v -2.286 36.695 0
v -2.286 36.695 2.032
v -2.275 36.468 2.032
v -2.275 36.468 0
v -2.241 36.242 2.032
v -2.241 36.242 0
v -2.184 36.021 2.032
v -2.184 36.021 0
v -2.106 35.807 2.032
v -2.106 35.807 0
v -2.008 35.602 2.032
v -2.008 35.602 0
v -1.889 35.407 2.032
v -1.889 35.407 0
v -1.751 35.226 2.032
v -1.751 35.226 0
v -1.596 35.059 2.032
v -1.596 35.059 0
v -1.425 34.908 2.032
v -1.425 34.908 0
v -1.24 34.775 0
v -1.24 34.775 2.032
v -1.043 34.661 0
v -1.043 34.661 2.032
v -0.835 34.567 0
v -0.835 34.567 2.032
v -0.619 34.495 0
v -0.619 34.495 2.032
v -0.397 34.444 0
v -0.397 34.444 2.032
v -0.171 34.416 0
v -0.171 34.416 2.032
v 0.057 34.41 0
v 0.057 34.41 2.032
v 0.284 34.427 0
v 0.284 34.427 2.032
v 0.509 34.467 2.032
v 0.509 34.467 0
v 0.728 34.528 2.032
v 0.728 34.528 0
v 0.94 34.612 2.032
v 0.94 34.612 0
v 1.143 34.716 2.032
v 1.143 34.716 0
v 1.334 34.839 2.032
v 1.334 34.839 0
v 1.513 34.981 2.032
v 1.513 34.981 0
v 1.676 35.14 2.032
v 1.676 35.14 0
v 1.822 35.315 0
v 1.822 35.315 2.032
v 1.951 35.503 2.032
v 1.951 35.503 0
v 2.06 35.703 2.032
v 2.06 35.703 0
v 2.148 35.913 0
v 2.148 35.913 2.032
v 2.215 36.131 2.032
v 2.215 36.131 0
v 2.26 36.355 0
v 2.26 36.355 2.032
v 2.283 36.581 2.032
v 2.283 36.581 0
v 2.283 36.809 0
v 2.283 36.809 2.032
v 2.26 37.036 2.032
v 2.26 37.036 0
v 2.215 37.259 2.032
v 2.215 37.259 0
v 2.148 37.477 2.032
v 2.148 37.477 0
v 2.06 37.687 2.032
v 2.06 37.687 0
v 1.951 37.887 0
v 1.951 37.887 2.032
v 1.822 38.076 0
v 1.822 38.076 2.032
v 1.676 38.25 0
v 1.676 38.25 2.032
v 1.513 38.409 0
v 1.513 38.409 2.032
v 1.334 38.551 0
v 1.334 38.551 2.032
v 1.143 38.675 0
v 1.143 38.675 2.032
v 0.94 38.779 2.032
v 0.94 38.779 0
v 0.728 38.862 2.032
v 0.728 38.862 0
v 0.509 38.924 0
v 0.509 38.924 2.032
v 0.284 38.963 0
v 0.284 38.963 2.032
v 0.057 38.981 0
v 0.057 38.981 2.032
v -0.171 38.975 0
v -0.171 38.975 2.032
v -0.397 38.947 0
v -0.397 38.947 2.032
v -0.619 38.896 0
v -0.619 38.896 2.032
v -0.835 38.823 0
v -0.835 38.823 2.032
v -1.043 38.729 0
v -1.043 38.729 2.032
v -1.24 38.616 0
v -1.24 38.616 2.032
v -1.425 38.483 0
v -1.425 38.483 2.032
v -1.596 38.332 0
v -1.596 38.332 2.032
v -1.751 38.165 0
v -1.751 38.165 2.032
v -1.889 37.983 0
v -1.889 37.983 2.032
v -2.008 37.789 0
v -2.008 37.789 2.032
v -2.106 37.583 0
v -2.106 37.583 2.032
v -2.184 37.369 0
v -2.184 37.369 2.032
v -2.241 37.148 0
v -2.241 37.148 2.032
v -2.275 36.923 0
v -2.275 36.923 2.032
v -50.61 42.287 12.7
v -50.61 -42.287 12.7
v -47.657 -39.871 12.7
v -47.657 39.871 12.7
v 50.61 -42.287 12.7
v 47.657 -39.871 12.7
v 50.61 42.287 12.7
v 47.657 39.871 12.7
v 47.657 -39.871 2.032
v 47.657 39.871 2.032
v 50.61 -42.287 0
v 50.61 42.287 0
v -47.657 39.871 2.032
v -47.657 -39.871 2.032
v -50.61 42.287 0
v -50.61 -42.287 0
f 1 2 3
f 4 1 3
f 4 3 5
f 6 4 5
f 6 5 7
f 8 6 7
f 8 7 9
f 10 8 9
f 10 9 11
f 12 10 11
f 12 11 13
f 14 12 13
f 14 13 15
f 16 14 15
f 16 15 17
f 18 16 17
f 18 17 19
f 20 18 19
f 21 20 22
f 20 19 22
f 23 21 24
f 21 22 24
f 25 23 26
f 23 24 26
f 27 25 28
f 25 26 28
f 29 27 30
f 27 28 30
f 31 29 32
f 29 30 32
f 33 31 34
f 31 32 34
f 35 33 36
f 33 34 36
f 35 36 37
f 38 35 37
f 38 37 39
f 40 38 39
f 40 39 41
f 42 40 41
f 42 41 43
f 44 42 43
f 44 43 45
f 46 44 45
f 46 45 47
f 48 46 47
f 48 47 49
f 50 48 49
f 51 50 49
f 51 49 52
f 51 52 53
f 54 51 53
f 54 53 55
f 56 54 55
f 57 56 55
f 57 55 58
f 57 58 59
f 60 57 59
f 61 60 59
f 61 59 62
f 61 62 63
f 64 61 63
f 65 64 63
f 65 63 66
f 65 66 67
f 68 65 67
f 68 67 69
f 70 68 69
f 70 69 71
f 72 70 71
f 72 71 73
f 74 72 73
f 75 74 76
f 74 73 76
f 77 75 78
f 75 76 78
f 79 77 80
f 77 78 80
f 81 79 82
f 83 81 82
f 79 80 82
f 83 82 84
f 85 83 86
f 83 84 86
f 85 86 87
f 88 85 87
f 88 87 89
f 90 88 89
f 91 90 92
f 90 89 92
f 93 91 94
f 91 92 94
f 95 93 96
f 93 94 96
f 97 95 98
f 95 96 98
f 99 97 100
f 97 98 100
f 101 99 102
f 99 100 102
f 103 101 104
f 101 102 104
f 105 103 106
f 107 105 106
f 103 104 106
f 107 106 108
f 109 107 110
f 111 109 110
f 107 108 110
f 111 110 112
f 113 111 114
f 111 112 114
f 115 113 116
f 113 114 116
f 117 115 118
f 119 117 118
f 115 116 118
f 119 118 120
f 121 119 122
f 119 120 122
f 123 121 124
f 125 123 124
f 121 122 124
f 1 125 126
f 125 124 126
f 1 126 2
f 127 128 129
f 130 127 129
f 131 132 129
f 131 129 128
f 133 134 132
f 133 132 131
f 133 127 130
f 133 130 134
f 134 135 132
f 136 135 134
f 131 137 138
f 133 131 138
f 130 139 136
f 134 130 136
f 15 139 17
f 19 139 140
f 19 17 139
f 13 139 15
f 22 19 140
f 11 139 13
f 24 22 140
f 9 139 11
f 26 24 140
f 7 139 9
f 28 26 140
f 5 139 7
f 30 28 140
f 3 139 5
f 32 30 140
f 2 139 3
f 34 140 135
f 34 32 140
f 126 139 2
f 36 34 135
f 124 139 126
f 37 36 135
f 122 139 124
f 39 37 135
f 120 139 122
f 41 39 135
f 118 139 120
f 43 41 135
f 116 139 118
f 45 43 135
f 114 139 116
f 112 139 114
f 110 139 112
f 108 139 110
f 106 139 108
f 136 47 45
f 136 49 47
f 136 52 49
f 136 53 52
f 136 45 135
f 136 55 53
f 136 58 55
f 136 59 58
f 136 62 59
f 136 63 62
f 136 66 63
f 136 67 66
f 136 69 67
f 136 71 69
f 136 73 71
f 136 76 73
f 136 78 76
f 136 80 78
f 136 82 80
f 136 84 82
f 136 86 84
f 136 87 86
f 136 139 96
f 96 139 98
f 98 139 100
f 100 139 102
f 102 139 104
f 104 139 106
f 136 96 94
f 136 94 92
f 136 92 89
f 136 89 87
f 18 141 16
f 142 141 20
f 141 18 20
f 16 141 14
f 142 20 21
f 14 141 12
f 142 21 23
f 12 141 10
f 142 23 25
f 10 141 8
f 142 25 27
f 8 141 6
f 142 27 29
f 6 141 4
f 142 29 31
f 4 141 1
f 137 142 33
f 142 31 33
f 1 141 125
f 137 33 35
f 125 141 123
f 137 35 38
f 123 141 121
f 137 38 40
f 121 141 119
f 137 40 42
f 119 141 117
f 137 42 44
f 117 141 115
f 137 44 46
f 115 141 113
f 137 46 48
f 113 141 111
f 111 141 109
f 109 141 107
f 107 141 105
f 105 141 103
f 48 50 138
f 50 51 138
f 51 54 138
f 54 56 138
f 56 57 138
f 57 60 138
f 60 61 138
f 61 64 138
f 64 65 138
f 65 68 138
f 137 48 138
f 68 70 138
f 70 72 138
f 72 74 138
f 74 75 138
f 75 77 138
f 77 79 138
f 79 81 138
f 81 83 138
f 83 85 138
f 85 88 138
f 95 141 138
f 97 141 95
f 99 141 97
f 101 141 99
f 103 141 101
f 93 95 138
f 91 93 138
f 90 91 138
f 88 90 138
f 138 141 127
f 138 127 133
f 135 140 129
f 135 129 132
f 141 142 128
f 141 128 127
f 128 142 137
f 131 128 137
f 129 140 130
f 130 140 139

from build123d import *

# Parameters (mm, degrees)
F0_W           = 101.2207046151
F0_H           = 84.5743343234
F0_W_2         = 95.3139290214
F0_H_2         = 79.7415152192
F1_DEPTH       = 12.7
F2_W           = 95.3139290214
F2_H           = 80.278493464
F3_DEPTH       = 2.032
F5_D           = 4.572
F5_CBORE_D     = 4.572
F5_CBORE_DEPTH = 4.572


with BuildPart() as f1:
    # F0 (on Top) → F1 (new body)
    with BuildSketch(Plane.XY):
        Rectangle(F0_W, F0_H)
        Rectangle(F0_W_2, F0_H_2, mode=Mode.SUBTRACT)
    extrude(amount=F1_DEPTH)

    # F2 (on Top) → F3 (join)
    with BuildSketch(Plane.XY):
        Rectangle(F2_W, F2_H)
    extrude(amount=F3_DEPTH)

    # F5 (through all)
    with Locations(Plane(origin=(0, 0, 0), x_dir=(1, 0, 0), z_dir=(0, 0, -1))):
        with Locations((0, -36.6952344775)):
            CounterBoreHole(F5_D / 2, F5_CBORE_D / 2, F5_CBORE_DEPTH)


solid = f1.part
